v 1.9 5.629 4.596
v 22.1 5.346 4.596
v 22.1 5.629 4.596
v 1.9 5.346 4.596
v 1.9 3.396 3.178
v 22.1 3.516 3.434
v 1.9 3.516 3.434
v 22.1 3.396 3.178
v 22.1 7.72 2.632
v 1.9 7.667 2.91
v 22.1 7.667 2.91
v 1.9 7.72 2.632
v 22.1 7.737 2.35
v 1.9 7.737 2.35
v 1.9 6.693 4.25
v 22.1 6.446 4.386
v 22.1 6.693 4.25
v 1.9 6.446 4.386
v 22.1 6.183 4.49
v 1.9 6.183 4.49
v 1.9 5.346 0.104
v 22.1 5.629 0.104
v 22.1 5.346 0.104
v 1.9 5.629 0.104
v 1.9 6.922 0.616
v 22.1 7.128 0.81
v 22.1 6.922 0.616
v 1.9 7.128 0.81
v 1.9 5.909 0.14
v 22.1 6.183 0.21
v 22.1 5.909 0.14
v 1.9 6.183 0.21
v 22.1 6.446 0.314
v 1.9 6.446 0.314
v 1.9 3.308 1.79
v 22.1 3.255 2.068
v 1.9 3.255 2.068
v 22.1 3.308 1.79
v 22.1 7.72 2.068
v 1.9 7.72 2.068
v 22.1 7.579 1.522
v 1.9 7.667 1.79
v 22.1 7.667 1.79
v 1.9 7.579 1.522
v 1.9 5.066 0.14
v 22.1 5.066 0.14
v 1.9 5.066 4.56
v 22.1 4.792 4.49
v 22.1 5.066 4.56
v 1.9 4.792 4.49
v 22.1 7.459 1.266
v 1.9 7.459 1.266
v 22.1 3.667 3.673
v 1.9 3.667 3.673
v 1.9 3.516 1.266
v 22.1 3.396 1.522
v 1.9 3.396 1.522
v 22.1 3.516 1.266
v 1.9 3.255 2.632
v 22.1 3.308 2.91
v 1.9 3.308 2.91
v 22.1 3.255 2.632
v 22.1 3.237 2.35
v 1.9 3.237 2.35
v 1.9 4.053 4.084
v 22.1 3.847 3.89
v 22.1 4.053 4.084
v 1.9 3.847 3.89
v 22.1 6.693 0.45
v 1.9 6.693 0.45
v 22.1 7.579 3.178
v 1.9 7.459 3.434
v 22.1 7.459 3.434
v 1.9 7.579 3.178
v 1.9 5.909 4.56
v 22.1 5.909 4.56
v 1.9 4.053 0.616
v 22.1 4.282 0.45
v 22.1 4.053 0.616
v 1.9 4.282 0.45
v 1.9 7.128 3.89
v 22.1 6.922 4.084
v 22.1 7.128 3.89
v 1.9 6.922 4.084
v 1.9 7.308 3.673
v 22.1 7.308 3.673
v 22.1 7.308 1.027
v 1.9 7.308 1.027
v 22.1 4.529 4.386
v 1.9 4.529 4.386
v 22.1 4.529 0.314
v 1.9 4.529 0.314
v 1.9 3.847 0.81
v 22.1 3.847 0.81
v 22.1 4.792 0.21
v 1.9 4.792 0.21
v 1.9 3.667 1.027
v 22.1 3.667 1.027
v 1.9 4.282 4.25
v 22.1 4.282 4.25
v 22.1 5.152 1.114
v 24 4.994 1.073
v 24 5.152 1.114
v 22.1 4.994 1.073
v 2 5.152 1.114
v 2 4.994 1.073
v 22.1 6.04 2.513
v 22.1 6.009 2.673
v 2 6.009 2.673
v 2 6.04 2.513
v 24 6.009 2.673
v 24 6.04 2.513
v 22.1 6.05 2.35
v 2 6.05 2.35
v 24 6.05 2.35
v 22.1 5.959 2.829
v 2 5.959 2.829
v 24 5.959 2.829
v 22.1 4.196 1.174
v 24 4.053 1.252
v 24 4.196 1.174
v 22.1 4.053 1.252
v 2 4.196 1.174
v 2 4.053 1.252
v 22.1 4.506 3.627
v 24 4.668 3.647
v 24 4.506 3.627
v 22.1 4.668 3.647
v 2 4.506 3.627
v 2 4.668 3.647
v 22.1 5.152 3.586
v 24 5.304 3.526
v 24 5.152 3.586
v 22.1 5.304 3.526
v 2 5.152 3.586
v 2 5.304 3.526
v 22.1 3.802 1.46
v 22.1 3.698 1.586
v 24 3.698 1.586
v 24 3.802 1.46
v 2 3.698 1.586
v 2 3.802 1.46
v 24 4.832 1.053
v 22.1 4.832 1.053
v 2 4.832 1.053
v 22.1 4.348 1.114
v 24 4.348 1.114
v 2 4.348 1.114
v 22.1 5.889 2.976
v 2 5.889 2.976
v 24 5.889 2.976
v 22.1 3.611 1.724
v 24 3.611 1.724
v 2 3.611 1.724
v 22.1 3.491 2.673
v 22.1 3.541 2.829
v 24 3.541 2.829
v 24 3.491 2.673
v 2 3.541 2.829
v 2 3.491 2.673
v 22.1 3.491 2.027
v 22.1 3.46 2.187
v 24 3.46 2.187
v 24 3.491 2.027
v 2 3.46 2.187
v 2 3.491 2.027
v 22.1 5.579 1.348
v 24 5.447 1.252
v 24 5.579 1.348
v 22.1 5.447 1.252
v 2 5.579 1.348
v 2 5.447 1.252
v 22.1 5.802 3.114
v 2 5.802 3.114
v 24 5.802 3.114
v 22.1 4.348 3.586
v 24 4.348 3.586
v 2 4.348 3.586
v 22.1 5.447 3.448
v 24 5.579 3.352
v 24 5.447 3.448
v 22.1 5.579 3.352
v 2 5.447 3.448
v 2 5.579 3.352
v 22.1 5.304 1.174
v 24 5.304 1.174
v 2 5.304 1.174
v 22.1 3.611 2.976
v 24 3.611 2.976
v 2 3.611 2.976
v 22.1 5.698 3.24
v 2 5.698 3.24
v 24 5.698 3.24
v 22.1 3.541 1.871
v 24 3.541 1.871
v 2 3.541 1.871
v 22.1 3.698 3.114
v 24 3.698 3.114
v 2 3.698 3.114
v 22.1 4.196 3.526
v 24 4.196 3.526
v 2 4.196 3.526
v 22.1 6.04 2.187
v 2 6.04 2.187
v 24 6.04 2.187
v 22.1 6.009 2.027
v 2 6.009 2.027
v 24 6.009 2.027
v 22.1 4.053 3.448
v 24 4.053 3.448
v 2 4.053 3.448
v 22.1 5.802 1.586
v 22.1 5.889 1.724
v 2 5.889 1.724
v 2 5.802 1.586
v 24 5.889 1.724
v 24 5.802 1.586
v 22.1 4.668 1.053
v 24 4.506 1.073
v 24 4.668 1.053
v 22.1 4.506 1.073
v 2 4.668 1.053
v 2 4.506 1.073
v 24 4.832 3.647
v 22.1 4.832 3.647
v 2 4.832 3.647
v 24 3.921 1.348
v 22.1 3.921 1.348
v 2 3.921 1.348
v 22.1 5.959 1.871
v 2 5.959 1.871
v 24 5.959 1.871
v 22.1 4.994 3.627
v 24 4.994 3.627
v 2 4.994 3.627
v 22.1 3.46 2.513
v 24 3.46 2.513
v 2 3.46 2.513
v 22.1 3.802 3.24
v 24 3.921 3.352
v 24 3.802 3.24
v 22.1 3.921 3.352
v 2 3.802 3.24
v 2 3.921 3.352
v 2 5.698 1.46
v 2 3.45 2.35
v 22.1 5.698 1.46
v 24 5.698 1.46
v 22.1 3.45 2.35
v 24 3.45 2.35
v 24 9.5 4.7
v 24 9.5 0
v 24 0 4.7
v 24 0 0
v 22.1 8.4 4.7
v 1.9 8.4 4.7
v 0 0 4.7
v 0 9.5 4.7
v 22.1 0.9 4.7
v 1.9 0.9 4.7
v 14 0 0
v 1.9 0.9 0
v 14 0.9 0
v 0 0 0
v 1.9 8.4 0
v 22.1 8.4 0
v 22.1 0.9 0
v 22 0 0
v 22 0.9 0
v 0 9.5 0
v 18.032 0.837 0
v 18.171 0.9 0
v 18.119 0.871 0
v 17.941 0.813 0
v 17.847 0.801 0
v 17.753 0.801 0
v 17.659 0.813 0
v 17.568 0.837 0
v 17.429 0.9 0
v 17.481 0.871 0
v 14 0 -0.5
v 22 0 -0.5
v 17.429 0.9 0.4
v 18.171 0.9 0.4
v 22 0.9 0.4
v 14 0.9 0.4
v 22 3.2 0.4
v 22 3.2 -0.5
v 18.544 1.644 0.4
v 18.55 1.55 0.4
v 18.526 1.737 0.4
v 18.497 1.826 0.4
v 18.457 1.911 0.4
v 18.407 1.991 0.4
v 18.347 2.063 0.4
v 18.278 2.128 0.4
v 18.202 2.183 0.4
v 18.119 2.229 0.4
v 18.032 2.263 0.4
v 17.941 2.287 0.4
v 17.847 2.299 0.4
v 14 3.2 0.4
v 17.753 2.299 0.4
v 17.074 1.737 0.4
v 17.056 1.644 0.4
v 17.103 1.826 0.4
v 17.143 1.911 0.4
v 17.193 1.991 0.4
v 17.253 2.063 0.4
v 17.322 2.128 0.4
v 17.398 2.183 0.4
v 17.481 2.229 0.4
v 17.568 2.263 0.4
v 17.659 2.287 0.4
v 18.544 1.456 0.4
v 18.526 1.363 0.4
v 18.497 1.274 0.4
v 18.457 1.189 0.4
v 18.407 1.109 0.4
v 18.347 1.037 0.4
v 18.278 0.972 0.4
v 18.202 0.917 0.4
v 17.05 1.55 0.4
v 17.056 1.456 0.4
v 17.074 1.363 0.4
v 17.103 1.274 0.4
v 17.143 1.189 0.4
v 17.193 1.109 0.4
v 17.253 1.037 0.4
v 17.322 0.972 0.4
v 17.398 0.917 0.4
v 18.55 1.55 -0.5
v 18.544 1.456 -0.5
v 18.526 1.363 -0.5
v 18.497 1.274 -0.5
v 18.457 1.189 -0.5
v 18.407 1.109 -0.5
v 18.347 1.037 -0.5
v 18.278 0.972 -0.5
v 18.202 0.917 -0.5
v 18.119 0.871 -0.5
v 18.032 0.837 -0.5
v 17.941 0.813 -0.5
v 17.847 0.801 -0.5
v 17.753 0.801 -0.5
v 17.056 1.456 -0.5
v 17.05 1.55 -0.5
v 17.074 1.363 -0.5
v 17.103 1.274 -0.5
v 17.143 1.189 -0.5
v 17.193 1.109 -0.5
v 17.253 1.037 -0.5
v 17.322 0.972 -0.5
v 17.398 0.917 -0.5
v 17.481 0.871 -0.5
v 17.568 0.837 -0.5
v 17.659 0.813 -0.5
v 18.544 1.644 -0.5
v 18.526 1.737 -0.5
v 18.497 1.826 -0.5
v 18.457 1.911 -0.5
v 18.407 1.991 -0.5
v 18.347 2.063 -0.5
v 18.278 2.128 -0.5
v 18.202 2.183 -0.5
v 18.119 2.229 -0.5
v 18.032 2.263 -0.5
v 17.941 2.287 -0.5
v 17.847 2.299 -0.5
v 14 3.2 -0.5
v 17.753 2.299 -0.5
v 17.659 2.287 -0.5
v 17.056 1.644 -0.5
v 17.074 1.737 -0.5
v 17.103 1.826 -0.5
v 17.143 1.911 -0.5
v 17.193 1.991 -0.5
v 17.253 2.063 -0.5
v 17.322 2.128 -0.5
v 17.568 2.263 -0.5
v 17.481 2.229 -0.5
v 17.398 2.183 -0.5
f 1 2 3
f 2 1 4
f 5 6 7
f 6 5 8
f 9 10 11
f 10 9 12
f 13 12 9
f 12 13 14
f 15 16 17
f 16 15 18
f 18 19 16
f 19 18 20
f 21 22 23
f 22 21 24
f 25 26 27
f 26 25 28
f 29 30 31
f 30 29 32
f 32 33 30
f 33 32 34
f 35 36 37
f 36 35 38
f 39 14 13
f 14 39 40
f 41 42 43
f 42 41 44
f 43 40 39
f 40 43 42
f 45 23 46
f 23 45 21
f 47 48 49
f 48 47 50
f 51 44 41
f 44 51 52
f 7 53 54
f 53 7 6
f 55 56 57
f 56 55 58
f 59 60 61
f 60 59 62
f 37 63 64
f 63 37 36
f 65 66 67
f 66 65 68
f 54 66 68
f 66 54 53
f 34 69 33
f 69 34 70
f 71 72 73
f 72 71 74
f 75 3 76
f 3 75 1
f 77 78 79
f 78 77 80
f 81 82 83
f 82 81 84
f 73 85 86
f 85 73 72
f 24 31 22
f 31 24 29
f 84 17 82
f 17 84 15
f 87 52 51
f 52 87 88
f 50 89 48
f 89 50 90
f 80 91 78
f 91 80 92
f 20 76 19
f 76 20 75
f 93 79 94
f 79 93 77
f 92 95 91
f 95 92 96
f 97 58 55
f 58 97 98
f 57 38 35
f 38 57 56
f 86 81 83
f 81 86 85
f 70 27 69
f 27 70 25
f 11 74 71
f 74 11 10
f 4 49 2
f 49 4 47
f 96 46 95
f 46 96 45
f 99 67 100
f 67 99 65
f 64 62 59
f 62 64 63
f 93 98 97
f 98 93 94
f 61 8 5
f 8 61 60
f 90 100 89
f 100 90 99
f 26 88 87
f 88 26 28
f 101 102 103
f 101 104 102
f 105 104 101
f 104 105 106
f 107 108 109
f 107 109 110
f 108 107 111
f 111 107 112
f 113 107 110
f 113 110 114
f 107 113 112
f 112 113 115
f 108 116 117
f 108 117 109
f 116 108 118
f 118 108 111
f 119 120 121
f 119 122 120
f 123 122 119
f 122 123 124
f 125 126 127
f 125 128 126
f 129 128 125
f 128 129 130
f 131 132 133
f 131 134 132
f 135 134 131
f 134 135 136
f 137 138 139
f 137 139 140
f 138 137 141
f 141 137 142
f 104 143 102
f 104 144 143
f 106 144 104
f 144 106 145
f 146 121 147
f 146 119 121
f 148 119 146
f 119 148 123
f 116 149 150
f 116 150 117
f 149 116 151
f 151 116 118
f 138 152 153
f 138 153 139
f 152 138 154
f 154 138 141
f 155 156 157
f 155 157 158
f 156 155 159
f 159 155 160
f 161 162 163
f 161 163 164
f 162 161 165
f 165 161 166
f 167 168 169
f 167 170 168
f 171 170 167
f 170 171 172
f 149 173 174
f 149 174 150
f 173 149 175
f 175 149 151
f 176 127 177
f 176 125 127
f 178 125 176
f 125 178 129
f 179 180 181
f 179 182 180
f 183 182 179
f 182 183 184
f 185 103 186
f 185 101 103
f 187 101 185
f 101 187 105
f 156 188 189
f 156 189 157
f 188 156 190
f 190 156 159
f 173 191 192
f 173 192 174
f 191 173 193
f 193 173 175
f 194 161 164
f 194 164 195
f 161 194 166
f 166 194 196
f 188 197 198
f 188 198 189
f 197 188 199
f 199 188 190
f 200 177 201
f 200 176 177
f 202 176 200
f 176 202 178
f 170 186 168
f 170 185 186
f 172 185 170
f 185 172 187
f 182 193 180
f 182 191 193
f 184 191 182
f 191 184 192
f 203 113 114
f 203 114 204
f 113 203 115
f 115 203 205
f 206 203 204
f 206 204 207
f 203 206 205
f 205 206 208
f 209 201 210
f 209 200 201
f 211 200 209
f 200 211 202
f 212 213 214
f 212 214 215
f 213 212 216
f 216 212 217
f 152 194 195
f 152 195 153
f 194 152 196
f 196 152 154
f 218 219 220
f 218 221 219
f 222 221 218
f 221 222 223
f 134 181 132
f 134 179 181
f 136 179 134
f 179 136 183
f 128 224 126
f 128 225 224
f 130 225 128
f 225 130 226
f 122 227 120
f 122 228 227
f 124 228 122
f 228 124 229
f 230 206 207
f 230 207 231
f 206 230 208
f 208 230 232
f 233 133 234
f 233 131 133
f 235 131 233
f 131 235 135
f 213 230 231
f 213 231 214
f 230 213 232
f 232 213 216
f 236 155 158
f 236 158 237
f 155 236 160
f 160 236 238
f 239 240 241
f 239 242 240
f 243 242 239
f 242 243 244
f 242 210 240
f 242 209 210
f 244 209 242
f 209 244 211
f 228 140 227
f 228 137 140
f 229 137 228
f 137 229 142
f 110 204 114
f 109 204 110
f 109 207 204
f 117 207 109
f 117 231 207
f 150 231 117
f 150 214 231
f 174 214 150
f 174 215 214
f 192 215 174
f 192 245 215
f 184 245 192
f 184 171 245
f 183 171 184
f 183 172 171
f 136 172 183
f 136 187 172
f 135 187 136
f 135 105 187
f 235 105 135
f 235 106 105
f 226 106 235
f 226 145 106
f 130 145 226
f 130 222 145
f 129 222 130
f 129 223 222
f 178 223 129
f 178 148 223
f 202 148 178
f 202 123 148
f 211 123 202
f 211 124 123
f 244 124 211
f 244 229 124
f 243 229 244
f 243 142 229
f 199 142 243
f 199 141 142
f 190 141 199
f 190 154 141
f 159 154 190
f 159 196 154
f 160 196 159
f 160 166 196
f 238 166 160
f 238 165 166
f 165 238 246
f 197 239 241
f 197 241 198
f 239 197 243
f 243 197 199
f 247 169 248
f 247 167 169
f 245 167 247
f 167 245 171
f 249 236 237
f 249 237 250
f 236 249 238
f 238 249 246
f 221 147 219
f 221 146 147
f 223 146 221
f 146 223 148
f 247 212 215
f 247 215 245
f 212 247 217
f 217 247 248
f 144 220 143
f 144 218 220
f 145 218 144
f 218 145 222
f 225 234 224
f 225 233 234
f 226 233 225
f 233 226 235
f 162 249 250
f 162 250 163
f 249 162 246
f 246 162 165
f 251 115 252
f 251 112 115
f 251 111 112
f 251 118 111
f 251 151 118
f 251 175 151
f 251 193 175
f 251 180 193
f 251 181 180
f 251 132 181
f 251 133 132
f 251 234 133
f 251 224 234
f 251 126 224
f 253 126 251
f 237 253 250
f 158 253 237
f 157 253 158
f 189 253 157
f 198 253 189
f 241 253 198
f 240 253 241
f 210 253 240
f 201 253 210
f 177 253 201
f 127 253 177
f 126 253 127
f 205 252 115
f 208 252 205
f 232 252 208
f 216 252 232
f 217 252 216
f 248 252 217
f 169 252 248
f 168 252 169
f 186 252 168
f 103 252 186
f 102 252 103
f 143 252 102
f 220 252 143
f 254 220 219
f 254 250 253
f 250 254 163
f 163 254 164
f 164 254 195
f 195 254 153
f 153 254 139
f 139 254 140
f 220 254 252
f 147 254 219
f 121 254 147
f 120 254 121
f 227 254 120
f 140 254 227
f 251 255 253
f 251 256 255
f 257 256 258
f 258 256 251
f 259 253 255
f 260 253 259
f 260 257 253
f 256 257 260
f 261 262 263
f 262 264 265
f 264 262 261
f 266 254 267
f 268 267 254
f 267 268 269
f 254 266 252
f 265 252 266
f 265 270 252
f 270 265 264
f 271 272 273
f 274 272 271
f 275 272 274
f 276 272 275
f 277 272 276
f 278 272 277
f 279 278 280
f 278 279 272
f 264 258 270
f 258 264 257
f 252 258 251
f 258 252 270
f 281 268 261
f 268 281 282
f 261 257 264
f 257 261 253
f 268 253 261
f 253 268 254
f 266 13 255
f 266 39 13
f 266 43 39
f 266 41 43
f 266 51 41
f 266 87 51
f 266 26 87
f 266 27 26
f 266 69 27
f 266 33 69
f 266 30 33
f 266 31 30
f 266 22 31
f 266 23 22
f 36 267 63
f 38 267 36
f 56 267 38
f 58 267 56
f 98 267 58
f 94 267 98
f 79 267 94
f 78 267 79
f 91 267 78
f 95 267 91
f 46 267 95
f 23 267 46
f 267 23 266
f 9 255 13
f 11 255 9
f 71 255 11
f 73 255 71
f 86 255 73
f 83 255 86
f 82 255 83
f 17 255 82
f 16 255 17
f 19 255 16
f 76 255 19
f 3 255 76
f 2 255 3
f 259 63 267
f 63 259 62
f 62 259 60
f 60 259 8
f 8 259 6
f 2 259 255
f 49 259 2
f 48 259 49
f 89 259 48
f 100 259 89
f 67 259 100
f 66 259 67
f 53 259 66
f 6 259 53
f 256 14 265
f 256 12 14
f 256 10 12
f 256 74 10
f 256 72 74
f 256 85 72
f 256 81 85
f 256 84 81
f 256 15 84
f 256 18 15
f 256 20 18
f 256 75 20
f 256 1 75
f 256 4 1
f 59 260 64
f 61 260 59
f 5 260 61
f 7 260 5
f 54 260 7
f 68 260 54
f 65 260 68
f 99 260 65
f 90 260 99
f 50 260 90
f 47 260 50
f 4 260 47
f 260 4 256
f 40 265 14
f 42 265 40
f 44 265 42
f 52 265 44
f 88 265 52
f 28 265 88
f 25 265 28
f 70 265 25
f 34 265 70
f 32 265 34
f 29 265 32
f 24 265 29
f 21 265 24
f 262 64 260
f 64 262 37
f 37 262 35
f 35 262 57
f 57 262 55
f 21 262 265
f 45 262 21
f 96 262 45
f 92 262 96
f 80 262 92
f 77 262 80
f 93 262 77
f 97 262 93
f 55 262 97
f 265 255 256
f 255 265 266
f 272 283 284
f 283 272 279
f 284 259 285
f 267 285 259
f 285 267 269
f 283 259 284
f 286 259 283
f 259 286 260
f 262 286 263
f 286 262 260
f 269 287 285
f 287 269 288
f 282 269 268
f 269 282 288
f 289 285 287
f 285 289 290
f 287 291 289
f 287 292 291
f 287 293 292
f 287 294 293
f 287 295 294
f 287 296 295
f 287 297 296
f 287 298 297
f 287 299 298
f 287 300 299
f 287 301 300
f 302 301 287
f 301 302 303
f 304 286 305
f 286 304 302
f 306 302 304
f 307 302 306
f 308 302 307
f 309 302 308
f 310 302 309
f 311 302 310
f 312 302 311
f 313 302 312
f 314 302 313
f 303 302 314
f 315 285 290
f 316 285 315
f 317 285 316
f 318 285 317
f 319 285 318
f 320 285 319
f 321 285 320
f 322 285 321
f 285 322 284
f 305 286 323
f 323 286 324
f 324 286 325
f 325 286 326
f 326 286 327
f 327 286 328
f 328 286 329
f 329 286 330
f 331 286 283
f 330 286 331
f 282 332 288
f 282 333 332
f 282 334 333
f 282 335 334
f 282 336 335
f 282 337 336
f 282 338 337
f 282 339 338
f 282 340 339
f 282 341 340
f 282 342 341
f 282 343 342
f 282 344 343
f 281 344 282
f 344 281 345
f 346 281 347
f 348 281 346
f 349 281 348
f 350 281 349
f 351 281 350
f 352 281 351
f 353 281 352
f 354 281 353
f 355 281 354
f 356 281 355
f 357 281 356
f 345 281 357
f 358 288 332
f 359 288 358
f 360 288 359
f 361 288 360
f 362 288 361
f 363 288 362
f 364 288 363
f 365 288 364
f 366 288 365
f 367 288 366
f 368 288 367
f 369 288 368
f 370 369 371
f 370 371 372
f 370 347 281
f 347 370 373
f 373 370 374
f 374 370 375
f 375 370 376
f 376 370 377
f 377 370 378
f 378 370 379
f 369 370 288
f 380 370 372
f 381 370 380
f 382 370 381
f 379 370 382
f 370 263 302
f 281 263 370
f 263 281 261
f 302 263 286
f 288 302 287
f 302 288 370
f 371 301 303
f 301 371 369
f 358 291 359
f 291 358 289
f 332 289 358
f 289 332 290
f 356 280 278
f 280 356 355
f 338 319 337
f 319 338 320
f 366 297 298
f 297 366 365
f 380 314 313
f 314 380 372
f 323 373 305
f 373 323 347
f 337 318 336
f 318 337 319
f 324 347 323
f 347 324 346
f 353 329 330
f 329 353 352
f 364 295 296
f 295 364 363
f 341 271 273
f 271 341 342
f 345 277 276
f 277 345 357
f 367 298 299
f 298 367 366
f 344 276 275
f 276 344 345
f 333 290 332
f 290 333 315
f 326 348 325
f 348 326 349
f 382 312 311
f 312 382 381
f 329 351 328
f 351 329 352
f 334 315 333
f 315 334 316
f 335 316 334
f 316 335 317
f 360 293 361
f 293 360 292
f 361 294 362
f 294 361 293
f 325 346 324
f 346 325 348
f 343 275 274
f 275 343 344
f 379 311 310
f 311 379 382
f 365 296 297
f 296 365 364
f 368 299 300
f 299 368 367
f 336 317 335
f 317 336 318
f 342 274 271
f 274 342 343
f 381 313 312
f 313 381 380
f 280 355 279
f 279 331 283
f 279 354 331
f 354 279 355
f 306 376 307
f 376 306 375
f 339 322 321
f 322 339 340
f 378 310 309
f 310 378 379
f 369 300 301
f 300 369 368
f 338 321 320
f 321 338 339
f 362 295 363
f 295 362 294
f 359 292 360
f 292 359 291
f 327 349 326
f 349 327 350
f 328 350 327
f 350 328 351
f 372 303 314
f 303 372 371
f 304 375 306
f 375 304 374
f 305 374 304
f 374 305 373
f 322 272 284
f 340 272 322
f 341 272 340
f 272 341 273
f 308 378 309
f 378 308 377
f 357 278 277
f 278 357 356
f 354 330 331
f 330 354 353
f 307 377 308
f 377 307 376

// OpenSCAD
$fn=50;

difference() {
    translate([0.9,5.4875,2.35]) {
        rotate([90,0,90]) {
            cylinder(d=4.5, h=22.2);
        }
    }
    translate([2,4.75,2.35]) {
        rotate([90,0,90]) {
            cylinder(d = 2.6, h = 24);
        }
    }
}

difference() {
    cube([24,9.5,4.7]);
    translate([1.9,0.9,0]) {
        cube([20.2,7.5,4.7]);
    }
    translate([2,4.75,2.35]) {
        rotate([90,0,90]) {
            cylinder(d = 2.6, h = 24);
        }
    }
    
}



difference() {
    translate([14,0,-0.5]) {
        cube([8,3.2,0.9]);
    }
    translate([17.8,1.55,-0.6]) {
        cylinder(d = 1.5, h = 2);
    }
}
